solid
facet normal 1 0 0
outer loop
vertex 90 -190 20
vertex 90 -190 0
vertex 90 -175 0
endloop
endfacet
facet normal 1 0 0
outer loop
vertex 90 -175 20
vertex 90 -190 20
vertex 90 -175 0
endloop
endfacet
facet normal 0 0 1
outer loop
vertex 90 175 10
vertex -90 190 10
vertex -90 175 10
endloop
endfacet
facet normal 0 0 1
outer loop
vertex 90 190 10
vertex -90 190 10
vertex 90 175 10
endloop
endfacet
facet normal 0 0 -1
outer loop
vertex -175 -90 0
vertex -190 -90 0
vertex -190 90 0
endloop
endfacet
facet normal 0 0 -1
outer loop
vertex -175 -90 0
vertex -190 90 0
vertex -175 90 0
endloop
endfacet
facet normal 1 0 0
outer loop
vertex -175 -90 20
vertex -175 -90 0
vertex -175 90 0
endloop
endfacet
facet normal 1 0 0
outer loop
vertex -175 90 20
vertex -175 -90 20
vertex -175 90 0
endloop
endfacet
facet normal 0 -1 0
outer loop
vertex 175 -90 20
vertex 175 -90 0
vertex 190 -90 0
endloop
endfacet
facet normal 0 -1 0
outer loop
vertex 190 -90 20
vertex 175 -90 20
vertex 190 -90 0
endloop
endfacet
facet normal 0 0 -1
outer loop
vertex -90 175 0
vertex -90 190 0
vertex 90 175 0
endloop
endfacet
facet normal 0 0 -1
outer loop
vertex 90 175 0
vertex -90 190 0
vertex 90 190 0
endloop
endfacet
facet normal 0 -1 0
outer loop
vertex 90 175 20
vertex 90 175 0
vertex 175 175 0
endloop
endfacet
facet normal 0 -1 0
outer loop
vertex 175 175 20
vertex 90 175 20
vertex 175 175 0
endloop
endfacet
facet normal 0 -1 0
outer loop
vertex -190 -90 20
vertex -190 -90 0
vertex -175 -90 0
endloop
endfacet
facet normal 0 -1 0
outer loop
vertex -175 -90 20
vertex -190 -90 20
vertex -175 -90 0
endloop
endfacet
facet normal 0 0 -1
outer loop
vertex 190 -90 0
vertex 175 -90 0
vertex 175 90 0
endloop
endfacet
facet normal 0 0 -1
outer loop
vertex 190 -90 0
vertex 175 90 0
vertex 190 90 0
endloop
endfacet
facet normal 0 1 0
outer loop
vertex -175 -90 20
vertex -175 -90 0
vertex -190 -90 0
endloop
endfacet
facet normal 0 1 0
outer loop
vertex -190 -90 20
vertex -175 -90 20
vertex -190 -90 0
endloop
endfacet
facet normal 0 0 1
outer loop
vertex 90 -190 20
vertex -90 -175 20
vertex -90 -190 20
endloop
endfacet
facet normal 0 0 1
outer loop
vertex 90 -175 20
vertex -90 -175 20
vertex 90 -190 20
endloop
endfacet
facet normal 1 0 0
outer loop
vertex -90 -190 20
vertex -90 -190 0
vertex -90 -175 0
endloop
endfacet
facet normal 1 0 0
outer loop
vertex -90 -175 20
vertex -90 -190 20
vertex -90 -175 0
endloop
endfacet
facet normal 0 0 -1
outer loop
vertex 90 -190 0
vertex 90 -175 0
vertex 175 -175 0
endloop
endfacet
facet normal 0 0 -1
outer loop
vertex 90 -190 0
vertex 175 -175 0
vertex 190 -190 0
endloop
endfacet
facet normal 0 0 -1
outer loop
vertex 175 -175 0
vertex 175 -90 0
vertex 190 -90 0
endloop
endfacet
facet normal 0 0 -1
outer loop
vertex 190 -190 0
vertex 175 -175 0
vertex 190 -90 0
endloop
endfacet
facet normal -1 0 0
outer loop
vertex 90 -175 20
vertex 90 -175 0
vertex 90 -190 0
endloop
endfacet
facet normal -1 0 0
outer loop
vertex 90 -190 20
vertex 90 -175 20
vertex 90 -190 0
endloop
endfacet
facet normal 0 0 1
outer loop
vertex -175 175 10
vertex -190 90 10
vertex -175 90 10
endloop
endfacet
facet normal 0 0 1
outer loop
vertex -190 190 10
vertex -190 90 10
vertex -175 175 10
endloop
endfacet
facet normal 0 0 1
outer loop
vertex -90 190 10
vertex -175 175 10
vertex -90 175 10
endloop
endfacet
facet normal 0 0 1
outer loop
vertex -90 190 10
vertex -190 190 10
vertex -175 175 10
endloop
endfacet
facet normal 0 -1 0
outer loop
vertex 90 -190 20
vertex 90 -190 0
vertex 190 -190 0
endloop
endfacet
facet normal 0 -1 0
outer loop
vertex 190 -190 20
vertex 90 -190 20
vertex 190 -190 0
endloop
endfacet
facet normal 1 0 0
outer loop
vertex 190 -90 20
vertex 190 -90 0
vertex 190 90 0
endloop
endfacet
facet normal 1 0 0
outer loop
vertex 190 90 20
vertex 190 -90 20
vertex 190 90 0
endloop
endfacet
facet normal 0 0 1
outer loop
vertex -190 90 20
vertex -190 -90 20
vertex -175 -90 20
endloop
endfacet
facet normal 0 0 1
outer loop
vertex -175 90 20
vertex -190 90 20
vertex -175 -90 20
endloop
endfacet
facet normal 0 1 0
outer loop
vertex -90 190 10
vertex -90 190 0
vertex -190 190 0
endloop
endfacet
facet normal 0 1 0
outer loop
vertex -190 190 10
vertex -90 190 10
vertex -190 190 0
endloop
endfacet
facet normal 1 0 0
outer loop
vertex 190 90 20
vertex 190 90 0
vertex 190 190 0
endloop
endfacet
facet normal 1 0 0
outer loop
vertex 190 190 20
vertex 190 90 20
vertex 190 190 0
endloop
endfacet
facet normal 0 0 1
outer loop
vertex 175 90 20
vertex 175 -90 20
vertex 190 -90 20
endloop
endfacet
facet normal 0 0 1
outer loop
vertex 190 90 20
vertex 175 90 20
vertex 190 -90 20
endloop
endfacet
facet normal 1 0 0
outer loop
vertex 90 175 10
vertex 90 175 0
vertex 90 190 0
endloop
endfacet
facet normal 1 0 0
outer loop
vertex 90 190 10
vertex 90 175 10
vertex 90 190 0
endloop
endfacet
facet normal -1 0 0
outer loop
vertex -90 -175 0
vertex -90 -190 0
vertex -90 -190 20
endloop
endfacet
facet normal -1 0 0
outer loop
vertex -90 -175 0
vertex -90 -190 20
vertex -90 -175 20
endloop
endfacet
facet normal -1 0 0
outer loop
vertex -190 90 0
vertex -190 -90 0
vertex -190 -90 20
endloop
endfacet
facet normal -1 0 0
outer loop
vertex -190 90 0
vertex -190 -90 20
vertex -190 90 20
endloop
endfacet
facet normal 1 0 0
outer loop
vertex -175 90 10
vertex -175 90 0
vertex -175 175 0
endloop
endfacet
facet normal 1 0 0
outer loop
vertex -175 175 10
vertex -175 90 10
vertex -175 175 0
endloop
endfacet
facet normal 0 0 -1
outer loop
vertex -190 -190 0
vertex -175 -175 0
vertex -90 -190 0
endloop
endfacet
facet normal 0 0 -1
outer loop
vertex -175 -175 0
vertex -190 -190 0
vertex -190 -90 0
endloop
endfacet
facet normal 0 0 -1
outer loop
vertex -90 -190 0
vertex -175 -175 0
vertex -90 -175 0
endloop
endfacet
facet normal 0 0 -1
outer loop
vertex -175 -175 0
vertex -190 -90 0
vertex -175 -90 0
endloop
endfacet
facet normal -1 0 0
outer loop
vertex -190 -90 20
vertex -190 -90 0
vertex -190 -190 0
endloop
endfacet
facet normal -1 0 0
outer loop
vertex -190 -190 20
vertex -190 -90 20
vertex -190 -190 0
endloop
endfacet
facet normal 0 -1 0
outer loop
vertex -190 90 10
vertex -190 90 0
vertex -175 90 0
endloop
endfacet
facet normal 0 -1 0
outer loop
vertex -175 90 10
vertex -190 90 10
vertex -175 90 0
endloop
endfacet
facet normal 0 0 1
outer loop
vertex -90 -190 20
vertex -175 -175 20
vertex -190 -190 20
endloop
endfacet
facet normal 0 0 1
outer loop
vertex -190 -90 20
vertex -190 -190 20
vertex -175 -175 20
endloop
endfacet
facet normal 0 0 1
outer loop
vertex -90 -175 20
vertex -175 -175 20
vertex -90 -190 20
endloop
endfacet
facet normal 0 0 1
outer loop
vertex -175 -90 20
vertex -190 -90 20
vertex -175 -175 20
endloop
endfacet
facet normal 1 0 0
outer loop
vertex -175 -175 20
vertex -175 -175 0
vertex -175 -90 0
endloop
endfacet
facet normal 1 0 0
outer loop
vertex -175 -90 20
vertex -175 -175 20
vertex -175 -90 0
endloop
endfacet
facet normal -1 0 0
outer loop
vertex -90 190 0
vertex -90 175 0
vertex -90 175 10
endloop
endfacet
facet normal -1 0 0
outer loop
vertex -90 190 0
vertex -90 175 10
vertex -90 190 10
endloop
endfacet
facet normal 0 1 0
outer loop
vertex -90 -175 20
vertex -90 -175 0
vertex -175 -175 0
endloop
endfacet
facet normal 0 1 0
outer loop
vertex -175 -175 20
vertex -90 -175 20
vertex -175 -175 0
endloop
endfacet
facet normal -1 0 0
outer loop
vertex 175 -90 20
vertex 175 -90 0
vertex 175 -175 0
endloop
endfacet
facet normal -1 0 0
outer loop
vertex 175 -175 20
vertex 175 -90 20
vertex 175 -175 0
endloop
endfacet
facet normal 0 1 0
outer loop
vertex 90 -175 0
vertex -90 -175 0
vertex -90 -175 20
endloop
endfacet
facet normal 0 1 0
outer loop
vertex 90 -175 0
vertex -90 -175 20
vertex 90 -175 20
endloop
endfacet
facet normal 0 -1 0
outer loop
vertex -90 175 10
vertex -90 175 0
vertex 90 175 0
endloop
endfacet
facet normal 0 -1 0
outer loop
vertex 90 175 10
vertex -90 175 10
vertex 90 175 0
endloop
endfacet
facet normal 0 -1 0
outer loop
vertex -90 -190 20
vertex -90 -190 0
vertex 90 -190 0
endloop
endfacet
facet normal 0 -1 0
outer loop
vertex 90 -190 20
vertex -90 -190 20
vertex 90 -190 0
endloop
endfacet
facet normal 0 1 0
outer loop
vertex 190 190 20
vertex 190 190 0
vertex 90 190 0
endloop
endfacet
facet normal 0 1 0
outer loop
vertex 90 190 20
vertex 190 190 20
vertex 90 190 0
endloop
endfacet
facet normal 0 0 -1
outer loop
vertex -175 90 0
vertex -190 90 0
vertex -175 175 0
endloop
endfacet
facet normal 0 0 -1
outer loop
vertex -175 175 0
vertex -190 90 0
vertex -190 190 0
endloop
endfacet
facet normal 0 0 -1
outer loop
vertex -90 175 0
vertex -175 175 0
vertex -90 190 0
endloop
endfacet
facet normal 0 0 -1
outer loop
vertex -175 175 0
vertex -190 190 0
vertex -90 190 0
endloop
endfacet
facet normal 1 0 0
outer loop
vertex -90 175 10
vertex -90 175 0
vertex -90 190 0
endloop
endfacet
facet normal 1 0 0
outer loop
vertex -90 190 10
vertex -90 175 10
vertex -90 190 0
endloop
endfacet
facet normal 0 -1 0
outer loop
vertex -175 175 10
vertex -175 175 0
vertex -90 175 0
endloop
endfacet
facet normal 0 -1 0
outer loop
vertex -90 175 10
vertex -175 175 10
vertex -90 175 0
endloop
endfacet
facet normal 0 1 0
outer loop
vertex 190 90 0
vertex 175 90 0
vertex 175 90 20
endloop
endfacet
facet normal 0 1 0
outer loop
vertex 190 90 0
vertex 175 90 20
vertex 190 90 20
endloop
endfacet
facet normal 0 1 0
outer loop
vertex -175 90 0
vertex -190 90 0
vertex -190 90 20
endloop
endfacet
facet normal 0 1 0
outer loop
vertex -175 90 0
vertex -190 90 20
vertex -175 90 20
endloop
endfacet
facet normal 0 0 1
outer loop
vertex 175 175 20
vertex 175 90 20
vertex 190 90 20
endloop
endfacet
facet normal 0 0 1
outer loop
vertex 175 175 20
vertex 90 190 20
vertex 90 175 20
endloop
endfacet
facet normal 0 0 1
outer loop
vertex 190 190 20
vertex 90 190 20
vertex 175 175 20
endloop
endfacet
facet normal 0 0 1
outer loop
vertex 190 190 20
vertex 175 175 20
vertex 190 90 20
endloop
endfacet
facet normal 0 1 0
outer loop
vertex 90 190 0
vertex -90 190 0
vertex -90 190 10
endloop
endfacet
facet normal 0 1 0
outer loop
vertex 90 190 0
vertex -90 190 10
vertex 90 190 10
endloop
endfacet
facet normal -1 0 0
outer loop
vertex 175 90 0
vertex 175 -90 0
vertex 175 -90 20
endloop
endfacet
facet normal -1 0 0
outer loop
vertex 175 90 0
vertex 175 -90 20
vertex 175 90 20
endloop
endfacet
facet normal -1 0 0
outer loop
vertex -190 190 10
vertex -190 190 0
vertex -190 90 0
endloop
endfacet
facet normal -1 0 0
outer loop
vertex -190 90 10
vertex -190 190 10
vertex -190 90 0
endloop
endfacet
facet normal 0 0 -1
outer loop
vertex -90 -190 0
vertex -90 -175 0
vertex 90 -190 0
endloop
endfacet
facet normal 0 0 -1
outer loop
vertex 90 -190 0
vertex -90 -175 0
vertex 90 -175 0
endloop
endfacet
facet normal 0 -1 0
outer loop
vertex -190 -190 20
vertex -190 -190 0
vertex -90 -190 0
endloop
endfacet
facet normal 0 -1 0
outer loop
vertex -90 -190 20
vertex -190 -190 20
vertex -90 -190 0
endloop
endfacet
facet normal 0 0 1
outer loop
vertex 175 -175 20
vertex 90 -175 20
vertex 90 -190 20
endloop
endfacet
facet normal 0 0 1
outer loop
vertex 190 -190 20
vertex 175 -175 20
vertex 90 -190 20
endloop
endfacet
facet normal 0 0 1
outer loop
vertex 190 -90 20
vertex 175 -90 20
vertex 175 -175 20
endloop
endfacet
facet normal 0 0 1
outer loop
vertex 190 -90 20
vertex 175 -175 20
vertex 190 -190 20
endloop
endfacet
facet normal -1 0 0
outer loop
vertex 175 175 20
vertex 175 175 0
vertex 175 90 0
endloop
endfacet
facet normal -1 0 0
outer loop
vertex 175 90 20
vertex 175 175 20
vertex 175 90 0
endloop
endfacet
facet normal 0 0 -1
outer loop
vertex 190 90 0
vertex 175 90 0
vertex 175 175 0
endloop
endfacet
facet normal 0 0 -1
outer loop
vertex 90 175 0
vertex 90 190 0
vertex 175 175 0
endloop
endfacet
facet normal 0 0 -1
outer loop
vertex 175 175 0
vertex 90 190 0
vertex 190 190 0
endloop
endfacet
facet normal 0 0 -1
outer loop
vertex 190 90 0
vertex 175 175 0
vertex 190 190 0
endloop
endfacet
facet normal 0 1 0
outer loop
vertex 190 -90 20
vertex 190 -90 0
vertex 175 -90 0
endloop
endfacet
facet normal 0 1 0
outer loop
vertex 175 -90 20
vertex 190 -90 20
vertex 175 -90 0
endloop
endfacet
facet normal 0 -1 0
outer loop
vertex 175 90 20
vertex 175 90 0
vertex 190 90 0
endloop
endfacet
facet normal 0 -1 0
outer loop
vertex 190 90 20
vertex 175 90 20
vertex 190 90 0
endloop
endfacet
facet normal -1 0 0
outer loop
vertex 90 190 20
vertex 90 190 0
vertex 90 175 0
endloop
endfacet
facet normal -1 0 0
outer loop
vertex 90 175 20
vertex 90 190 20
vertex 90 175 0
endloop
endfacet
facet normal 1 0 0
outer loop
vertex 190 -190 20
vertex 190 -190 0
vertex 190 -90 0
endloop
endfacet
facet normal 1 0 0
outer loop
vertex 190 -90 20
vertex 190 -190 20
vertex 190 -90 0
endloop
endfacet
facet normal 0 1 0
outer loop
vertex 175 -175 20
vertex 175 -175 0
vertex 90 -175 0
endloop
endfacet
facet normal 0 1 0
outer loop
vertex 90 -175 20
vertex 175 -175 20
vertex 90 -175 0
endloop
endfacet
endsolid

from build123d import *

# Parameters (mm, degrees)
F1_DEPTH = 10
F0_W     = 180
F0_H     = 15
F2_DEPTH = 10
F3_DEPTH = 20
F0_W_2   = 15
F0_H_2   = 180
F4_DEPTH = 20
F5_DEPTH = 20
F6_DEPTH = 20
F7_DEPTH = 20
F8_DEPTH = 20


with BuildPart() as f1:
    # F0 (on Top) → F1 (new body)
    with BuildSketch(Plane.XY):
        Polygon((-190, 90), (-175, 90), (-175, 175), (-90, 175), (-90, 190), (-190, 190), align=None)
    extrude(amount=F1_DEPTH)


with BuildPart() as f2:
    # F0 (on Top) → F2 (new body)
    with BuildSketch(Plane.XY):
        with Locations((0, 182.5)):
            Rectangle(F0_W, F0_H)
    extrude(amount=F2_DEPTH)


with BuildPart() as f3:
    # F0 (on Top) → F3 (new body)
    with BuildSketch(Plane.XY):
        Polygon((175, 175), (175, 90), (190, 90), (190, 190), (90, 190), (90, 175), align=None)
    extrude(amount=F3_DEPTH)


with BuildPart() as f4:
    # F0 (on Top) → F4 (new body)
    with BuildSketch(Plane.XY):
        with Locations((-182.5, 0)):
            Rectangle(F0_W_2, F0_H_2)
    extrude(amount=F4_DEPTH)


with BuildPart() as f5:
    # F0 (on Top) → F5 (new body)
    with BuildSketch(Plane.XY):
        Polygon((-90, -190), (-90, -175), (-175, -175), (-175, -90), (-190, -90), (-190, -190), align=None)
    extrude(amount=F5_DEPTH)


with BuildPart() as f6:
    # F0 (on Top) → F6 (new body)
    with BuildSketch(Plane.XY):
        with Locations((0, -182.5)):
            Rectangle(F0_W, F0_H)
    extrude(amount=F6_DEPTH)


with BuildPart() as f7:
    # F0 (on Top) → F7 (new body)
    with BuildSketch(Plane.XY):
        Polygon((175, -90), (175, -175), (90, -175), (90, -190), (190, -190), (190, -90), align=None)
    extrude(amount=F7_DEPTH)


with BuildPart() as f8:
    # F0 (on Top) → F8 (new body)
    with BuildSketch(Plane.XY):
        with Locations((182.5, 0)):
            Rectangle(F0_W_2, F0_H_2)
    extrude(amount=F8_DEPTH)


solid = Compound([f1.part, f2.part, f3.part, f4.part, f5.part, f6.part, f7.part, f8.part])
